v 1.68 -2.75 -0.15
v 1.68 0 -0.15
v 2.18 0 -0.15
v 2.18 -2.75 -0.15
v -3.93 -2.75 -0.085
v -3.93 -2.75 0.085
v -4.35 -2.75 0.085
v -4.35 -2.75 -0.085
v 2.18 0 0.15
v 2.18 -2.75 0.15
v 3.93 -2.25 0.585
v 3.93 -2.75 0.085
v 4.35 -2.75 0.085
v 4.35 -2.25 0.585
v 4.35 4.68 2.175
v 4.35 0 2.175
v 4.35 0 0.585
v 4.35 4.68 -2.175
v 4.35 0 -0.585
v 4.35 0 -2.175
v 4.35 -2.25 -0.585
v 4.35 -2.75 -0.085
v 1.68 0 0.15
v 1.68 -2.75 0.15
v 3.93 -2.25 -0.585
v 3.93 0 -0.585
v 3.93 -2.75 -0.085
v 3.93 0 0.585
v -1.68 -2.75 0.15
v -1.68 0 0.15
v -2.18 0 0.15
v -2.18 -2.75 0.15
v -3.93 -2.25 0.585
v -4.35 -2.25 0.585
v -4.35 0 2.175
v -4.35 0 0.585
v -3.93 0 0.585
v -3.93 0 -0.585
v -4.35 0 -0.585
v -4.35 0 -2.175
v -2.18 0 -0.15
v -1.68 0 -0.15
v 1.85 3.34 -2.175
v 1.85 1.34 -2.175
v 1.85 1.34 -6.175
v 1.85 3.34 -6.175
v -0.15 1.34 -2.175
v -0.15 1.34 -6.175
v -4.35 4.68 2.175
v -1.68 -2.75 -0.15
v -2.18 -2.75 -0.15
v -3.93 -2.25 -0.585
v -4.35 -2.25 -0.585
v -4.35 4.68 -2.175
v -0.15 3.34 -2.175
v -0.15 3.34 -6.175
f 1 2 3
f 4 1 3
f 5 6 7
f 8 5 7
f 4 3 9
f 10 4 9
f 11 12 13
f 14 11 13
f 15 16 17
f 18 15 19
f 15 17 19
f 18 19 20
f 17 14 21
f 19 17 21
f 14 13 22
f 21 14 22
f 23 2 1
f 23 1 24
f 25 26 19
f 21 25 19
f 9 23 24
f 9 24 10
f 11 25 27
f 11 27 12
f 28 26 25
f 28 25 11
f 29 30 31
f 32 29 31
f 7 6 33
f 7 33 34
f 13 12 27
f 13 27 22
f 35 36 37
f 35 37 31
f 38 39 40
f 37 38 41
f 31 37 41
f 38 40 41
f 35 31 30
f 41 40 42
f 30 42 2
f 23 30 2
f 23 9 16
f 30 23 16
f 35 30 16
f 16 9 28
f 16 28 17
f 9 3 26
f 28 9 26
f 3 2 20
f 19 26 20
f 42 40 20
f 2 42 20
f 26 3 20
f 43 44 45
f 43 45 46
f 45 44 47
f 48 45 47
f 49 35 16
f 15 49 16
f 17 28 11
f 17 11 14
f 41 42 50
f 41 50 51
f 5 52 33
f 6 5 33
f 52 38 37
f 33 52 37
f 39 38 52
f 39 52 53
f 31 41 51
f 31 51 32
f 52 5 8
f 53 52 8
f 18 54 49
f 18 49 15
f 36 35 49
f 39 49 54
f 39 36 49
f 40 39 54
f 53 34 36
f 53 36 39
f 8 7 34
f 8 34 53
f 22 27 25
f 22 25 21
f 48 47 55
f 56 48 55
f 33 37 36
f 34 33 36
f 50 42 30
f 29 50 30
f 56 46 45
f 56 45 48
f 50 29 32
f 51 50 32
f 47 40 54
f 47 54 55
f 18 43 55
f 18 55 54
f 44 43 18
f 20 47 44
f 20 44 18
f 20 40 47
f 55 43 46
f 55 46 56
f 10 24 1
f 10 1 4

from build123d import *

# Parameters (mm, degrees)
SKETCH1_W                = 8.7
SKETCH1_H                = 4.35
BOSS_EXTRUDE1_DEPTH      = 4.68
SKETCH3_W                = 2
SKETCH3_H                = 2
BOSS_EXTRUDE3_DEPTH      = 4
SKETCH4_W                = 0.42
SKETCH4_H                = 1.17
SKETCH4_W_2              = 0.5
SKETCH4_H_2              = 0.3
BOSS_EXTRUDE4_DEPTH      = 2.75
CHAMFER1_SIZE            = 0.5
CHAMFER1_OF_MIRROR1_SIZE = 0.5


with BuildPart() as part:
    # Sketch1 → Boss-Extrude1 (new body)
    with BuildSketch(Plane(origin=(0, 0, 0), x_dir=(1, 0, 0), z_dir=(0, 1, 0))):
        Rectangle(SKETCH1_W, SKETCH1_H)
    extrude(amount=BOSS_EXTRUDE1_DEPTH)

    # Sketch3 → Boss-Extrude3 (add)
    with BuildSketch(Plane(origin=(0, 0, -2.175), x_dir=(-1, 0, 0), z_dir=(0, 0, -1))):
        with Locations((-0.85, 2.34)):
            Rectangle(SKETCH3_W, SKETCH3_H)
    extrude(amount=BOSS_EXTRUDE3_DEPTH)

    # Sketch4 → Boss-Extrude4 (add)
    with BuildSketch(Plane.XZ):
        with Locations((4.14, 0)):
            Rectangle(SKETCH4_W, SKETCH4_H)
        with Locations((1.93, 0)):
            Rectangle(SKETCH4_W_2, SKETCH4_H_2)
    boss_extrude4 = extrude(amount=BOSS_EXTRUDE4_DEPTH)

    # Chamfer1
    chamfer1_edges = [part.edges().sort_by_distance(p)[0] for p in [
        (4.14, -2.75, 0.585),
        (4.14, -2.75, -0.585),
    ]]
    chamfer(chamfer1_edges, length=CHAMFER1_SIZE)

    # Mirror1: Boss-Extrude4 across plane
    add(boss_extrude4.mirror(Plane(origin=(0, 0, 0), x_dir=(0, 0, 1), z_dir=(1, 0, 0))))

    # Chamfer1 of Mirror1
    chamfer1_of_mirror1_edges = [part.edges().sort_by_distance(p)[0] for p in [
        (-4.14, -2.75, 0.585),
        (-4.14, -2.75, -0.585),
    ]]
    chamfer(chamfer1_of_mirror1_edges, length=CHAMFER1_OF_MIRROR1_SIZE)


solid = part.part
